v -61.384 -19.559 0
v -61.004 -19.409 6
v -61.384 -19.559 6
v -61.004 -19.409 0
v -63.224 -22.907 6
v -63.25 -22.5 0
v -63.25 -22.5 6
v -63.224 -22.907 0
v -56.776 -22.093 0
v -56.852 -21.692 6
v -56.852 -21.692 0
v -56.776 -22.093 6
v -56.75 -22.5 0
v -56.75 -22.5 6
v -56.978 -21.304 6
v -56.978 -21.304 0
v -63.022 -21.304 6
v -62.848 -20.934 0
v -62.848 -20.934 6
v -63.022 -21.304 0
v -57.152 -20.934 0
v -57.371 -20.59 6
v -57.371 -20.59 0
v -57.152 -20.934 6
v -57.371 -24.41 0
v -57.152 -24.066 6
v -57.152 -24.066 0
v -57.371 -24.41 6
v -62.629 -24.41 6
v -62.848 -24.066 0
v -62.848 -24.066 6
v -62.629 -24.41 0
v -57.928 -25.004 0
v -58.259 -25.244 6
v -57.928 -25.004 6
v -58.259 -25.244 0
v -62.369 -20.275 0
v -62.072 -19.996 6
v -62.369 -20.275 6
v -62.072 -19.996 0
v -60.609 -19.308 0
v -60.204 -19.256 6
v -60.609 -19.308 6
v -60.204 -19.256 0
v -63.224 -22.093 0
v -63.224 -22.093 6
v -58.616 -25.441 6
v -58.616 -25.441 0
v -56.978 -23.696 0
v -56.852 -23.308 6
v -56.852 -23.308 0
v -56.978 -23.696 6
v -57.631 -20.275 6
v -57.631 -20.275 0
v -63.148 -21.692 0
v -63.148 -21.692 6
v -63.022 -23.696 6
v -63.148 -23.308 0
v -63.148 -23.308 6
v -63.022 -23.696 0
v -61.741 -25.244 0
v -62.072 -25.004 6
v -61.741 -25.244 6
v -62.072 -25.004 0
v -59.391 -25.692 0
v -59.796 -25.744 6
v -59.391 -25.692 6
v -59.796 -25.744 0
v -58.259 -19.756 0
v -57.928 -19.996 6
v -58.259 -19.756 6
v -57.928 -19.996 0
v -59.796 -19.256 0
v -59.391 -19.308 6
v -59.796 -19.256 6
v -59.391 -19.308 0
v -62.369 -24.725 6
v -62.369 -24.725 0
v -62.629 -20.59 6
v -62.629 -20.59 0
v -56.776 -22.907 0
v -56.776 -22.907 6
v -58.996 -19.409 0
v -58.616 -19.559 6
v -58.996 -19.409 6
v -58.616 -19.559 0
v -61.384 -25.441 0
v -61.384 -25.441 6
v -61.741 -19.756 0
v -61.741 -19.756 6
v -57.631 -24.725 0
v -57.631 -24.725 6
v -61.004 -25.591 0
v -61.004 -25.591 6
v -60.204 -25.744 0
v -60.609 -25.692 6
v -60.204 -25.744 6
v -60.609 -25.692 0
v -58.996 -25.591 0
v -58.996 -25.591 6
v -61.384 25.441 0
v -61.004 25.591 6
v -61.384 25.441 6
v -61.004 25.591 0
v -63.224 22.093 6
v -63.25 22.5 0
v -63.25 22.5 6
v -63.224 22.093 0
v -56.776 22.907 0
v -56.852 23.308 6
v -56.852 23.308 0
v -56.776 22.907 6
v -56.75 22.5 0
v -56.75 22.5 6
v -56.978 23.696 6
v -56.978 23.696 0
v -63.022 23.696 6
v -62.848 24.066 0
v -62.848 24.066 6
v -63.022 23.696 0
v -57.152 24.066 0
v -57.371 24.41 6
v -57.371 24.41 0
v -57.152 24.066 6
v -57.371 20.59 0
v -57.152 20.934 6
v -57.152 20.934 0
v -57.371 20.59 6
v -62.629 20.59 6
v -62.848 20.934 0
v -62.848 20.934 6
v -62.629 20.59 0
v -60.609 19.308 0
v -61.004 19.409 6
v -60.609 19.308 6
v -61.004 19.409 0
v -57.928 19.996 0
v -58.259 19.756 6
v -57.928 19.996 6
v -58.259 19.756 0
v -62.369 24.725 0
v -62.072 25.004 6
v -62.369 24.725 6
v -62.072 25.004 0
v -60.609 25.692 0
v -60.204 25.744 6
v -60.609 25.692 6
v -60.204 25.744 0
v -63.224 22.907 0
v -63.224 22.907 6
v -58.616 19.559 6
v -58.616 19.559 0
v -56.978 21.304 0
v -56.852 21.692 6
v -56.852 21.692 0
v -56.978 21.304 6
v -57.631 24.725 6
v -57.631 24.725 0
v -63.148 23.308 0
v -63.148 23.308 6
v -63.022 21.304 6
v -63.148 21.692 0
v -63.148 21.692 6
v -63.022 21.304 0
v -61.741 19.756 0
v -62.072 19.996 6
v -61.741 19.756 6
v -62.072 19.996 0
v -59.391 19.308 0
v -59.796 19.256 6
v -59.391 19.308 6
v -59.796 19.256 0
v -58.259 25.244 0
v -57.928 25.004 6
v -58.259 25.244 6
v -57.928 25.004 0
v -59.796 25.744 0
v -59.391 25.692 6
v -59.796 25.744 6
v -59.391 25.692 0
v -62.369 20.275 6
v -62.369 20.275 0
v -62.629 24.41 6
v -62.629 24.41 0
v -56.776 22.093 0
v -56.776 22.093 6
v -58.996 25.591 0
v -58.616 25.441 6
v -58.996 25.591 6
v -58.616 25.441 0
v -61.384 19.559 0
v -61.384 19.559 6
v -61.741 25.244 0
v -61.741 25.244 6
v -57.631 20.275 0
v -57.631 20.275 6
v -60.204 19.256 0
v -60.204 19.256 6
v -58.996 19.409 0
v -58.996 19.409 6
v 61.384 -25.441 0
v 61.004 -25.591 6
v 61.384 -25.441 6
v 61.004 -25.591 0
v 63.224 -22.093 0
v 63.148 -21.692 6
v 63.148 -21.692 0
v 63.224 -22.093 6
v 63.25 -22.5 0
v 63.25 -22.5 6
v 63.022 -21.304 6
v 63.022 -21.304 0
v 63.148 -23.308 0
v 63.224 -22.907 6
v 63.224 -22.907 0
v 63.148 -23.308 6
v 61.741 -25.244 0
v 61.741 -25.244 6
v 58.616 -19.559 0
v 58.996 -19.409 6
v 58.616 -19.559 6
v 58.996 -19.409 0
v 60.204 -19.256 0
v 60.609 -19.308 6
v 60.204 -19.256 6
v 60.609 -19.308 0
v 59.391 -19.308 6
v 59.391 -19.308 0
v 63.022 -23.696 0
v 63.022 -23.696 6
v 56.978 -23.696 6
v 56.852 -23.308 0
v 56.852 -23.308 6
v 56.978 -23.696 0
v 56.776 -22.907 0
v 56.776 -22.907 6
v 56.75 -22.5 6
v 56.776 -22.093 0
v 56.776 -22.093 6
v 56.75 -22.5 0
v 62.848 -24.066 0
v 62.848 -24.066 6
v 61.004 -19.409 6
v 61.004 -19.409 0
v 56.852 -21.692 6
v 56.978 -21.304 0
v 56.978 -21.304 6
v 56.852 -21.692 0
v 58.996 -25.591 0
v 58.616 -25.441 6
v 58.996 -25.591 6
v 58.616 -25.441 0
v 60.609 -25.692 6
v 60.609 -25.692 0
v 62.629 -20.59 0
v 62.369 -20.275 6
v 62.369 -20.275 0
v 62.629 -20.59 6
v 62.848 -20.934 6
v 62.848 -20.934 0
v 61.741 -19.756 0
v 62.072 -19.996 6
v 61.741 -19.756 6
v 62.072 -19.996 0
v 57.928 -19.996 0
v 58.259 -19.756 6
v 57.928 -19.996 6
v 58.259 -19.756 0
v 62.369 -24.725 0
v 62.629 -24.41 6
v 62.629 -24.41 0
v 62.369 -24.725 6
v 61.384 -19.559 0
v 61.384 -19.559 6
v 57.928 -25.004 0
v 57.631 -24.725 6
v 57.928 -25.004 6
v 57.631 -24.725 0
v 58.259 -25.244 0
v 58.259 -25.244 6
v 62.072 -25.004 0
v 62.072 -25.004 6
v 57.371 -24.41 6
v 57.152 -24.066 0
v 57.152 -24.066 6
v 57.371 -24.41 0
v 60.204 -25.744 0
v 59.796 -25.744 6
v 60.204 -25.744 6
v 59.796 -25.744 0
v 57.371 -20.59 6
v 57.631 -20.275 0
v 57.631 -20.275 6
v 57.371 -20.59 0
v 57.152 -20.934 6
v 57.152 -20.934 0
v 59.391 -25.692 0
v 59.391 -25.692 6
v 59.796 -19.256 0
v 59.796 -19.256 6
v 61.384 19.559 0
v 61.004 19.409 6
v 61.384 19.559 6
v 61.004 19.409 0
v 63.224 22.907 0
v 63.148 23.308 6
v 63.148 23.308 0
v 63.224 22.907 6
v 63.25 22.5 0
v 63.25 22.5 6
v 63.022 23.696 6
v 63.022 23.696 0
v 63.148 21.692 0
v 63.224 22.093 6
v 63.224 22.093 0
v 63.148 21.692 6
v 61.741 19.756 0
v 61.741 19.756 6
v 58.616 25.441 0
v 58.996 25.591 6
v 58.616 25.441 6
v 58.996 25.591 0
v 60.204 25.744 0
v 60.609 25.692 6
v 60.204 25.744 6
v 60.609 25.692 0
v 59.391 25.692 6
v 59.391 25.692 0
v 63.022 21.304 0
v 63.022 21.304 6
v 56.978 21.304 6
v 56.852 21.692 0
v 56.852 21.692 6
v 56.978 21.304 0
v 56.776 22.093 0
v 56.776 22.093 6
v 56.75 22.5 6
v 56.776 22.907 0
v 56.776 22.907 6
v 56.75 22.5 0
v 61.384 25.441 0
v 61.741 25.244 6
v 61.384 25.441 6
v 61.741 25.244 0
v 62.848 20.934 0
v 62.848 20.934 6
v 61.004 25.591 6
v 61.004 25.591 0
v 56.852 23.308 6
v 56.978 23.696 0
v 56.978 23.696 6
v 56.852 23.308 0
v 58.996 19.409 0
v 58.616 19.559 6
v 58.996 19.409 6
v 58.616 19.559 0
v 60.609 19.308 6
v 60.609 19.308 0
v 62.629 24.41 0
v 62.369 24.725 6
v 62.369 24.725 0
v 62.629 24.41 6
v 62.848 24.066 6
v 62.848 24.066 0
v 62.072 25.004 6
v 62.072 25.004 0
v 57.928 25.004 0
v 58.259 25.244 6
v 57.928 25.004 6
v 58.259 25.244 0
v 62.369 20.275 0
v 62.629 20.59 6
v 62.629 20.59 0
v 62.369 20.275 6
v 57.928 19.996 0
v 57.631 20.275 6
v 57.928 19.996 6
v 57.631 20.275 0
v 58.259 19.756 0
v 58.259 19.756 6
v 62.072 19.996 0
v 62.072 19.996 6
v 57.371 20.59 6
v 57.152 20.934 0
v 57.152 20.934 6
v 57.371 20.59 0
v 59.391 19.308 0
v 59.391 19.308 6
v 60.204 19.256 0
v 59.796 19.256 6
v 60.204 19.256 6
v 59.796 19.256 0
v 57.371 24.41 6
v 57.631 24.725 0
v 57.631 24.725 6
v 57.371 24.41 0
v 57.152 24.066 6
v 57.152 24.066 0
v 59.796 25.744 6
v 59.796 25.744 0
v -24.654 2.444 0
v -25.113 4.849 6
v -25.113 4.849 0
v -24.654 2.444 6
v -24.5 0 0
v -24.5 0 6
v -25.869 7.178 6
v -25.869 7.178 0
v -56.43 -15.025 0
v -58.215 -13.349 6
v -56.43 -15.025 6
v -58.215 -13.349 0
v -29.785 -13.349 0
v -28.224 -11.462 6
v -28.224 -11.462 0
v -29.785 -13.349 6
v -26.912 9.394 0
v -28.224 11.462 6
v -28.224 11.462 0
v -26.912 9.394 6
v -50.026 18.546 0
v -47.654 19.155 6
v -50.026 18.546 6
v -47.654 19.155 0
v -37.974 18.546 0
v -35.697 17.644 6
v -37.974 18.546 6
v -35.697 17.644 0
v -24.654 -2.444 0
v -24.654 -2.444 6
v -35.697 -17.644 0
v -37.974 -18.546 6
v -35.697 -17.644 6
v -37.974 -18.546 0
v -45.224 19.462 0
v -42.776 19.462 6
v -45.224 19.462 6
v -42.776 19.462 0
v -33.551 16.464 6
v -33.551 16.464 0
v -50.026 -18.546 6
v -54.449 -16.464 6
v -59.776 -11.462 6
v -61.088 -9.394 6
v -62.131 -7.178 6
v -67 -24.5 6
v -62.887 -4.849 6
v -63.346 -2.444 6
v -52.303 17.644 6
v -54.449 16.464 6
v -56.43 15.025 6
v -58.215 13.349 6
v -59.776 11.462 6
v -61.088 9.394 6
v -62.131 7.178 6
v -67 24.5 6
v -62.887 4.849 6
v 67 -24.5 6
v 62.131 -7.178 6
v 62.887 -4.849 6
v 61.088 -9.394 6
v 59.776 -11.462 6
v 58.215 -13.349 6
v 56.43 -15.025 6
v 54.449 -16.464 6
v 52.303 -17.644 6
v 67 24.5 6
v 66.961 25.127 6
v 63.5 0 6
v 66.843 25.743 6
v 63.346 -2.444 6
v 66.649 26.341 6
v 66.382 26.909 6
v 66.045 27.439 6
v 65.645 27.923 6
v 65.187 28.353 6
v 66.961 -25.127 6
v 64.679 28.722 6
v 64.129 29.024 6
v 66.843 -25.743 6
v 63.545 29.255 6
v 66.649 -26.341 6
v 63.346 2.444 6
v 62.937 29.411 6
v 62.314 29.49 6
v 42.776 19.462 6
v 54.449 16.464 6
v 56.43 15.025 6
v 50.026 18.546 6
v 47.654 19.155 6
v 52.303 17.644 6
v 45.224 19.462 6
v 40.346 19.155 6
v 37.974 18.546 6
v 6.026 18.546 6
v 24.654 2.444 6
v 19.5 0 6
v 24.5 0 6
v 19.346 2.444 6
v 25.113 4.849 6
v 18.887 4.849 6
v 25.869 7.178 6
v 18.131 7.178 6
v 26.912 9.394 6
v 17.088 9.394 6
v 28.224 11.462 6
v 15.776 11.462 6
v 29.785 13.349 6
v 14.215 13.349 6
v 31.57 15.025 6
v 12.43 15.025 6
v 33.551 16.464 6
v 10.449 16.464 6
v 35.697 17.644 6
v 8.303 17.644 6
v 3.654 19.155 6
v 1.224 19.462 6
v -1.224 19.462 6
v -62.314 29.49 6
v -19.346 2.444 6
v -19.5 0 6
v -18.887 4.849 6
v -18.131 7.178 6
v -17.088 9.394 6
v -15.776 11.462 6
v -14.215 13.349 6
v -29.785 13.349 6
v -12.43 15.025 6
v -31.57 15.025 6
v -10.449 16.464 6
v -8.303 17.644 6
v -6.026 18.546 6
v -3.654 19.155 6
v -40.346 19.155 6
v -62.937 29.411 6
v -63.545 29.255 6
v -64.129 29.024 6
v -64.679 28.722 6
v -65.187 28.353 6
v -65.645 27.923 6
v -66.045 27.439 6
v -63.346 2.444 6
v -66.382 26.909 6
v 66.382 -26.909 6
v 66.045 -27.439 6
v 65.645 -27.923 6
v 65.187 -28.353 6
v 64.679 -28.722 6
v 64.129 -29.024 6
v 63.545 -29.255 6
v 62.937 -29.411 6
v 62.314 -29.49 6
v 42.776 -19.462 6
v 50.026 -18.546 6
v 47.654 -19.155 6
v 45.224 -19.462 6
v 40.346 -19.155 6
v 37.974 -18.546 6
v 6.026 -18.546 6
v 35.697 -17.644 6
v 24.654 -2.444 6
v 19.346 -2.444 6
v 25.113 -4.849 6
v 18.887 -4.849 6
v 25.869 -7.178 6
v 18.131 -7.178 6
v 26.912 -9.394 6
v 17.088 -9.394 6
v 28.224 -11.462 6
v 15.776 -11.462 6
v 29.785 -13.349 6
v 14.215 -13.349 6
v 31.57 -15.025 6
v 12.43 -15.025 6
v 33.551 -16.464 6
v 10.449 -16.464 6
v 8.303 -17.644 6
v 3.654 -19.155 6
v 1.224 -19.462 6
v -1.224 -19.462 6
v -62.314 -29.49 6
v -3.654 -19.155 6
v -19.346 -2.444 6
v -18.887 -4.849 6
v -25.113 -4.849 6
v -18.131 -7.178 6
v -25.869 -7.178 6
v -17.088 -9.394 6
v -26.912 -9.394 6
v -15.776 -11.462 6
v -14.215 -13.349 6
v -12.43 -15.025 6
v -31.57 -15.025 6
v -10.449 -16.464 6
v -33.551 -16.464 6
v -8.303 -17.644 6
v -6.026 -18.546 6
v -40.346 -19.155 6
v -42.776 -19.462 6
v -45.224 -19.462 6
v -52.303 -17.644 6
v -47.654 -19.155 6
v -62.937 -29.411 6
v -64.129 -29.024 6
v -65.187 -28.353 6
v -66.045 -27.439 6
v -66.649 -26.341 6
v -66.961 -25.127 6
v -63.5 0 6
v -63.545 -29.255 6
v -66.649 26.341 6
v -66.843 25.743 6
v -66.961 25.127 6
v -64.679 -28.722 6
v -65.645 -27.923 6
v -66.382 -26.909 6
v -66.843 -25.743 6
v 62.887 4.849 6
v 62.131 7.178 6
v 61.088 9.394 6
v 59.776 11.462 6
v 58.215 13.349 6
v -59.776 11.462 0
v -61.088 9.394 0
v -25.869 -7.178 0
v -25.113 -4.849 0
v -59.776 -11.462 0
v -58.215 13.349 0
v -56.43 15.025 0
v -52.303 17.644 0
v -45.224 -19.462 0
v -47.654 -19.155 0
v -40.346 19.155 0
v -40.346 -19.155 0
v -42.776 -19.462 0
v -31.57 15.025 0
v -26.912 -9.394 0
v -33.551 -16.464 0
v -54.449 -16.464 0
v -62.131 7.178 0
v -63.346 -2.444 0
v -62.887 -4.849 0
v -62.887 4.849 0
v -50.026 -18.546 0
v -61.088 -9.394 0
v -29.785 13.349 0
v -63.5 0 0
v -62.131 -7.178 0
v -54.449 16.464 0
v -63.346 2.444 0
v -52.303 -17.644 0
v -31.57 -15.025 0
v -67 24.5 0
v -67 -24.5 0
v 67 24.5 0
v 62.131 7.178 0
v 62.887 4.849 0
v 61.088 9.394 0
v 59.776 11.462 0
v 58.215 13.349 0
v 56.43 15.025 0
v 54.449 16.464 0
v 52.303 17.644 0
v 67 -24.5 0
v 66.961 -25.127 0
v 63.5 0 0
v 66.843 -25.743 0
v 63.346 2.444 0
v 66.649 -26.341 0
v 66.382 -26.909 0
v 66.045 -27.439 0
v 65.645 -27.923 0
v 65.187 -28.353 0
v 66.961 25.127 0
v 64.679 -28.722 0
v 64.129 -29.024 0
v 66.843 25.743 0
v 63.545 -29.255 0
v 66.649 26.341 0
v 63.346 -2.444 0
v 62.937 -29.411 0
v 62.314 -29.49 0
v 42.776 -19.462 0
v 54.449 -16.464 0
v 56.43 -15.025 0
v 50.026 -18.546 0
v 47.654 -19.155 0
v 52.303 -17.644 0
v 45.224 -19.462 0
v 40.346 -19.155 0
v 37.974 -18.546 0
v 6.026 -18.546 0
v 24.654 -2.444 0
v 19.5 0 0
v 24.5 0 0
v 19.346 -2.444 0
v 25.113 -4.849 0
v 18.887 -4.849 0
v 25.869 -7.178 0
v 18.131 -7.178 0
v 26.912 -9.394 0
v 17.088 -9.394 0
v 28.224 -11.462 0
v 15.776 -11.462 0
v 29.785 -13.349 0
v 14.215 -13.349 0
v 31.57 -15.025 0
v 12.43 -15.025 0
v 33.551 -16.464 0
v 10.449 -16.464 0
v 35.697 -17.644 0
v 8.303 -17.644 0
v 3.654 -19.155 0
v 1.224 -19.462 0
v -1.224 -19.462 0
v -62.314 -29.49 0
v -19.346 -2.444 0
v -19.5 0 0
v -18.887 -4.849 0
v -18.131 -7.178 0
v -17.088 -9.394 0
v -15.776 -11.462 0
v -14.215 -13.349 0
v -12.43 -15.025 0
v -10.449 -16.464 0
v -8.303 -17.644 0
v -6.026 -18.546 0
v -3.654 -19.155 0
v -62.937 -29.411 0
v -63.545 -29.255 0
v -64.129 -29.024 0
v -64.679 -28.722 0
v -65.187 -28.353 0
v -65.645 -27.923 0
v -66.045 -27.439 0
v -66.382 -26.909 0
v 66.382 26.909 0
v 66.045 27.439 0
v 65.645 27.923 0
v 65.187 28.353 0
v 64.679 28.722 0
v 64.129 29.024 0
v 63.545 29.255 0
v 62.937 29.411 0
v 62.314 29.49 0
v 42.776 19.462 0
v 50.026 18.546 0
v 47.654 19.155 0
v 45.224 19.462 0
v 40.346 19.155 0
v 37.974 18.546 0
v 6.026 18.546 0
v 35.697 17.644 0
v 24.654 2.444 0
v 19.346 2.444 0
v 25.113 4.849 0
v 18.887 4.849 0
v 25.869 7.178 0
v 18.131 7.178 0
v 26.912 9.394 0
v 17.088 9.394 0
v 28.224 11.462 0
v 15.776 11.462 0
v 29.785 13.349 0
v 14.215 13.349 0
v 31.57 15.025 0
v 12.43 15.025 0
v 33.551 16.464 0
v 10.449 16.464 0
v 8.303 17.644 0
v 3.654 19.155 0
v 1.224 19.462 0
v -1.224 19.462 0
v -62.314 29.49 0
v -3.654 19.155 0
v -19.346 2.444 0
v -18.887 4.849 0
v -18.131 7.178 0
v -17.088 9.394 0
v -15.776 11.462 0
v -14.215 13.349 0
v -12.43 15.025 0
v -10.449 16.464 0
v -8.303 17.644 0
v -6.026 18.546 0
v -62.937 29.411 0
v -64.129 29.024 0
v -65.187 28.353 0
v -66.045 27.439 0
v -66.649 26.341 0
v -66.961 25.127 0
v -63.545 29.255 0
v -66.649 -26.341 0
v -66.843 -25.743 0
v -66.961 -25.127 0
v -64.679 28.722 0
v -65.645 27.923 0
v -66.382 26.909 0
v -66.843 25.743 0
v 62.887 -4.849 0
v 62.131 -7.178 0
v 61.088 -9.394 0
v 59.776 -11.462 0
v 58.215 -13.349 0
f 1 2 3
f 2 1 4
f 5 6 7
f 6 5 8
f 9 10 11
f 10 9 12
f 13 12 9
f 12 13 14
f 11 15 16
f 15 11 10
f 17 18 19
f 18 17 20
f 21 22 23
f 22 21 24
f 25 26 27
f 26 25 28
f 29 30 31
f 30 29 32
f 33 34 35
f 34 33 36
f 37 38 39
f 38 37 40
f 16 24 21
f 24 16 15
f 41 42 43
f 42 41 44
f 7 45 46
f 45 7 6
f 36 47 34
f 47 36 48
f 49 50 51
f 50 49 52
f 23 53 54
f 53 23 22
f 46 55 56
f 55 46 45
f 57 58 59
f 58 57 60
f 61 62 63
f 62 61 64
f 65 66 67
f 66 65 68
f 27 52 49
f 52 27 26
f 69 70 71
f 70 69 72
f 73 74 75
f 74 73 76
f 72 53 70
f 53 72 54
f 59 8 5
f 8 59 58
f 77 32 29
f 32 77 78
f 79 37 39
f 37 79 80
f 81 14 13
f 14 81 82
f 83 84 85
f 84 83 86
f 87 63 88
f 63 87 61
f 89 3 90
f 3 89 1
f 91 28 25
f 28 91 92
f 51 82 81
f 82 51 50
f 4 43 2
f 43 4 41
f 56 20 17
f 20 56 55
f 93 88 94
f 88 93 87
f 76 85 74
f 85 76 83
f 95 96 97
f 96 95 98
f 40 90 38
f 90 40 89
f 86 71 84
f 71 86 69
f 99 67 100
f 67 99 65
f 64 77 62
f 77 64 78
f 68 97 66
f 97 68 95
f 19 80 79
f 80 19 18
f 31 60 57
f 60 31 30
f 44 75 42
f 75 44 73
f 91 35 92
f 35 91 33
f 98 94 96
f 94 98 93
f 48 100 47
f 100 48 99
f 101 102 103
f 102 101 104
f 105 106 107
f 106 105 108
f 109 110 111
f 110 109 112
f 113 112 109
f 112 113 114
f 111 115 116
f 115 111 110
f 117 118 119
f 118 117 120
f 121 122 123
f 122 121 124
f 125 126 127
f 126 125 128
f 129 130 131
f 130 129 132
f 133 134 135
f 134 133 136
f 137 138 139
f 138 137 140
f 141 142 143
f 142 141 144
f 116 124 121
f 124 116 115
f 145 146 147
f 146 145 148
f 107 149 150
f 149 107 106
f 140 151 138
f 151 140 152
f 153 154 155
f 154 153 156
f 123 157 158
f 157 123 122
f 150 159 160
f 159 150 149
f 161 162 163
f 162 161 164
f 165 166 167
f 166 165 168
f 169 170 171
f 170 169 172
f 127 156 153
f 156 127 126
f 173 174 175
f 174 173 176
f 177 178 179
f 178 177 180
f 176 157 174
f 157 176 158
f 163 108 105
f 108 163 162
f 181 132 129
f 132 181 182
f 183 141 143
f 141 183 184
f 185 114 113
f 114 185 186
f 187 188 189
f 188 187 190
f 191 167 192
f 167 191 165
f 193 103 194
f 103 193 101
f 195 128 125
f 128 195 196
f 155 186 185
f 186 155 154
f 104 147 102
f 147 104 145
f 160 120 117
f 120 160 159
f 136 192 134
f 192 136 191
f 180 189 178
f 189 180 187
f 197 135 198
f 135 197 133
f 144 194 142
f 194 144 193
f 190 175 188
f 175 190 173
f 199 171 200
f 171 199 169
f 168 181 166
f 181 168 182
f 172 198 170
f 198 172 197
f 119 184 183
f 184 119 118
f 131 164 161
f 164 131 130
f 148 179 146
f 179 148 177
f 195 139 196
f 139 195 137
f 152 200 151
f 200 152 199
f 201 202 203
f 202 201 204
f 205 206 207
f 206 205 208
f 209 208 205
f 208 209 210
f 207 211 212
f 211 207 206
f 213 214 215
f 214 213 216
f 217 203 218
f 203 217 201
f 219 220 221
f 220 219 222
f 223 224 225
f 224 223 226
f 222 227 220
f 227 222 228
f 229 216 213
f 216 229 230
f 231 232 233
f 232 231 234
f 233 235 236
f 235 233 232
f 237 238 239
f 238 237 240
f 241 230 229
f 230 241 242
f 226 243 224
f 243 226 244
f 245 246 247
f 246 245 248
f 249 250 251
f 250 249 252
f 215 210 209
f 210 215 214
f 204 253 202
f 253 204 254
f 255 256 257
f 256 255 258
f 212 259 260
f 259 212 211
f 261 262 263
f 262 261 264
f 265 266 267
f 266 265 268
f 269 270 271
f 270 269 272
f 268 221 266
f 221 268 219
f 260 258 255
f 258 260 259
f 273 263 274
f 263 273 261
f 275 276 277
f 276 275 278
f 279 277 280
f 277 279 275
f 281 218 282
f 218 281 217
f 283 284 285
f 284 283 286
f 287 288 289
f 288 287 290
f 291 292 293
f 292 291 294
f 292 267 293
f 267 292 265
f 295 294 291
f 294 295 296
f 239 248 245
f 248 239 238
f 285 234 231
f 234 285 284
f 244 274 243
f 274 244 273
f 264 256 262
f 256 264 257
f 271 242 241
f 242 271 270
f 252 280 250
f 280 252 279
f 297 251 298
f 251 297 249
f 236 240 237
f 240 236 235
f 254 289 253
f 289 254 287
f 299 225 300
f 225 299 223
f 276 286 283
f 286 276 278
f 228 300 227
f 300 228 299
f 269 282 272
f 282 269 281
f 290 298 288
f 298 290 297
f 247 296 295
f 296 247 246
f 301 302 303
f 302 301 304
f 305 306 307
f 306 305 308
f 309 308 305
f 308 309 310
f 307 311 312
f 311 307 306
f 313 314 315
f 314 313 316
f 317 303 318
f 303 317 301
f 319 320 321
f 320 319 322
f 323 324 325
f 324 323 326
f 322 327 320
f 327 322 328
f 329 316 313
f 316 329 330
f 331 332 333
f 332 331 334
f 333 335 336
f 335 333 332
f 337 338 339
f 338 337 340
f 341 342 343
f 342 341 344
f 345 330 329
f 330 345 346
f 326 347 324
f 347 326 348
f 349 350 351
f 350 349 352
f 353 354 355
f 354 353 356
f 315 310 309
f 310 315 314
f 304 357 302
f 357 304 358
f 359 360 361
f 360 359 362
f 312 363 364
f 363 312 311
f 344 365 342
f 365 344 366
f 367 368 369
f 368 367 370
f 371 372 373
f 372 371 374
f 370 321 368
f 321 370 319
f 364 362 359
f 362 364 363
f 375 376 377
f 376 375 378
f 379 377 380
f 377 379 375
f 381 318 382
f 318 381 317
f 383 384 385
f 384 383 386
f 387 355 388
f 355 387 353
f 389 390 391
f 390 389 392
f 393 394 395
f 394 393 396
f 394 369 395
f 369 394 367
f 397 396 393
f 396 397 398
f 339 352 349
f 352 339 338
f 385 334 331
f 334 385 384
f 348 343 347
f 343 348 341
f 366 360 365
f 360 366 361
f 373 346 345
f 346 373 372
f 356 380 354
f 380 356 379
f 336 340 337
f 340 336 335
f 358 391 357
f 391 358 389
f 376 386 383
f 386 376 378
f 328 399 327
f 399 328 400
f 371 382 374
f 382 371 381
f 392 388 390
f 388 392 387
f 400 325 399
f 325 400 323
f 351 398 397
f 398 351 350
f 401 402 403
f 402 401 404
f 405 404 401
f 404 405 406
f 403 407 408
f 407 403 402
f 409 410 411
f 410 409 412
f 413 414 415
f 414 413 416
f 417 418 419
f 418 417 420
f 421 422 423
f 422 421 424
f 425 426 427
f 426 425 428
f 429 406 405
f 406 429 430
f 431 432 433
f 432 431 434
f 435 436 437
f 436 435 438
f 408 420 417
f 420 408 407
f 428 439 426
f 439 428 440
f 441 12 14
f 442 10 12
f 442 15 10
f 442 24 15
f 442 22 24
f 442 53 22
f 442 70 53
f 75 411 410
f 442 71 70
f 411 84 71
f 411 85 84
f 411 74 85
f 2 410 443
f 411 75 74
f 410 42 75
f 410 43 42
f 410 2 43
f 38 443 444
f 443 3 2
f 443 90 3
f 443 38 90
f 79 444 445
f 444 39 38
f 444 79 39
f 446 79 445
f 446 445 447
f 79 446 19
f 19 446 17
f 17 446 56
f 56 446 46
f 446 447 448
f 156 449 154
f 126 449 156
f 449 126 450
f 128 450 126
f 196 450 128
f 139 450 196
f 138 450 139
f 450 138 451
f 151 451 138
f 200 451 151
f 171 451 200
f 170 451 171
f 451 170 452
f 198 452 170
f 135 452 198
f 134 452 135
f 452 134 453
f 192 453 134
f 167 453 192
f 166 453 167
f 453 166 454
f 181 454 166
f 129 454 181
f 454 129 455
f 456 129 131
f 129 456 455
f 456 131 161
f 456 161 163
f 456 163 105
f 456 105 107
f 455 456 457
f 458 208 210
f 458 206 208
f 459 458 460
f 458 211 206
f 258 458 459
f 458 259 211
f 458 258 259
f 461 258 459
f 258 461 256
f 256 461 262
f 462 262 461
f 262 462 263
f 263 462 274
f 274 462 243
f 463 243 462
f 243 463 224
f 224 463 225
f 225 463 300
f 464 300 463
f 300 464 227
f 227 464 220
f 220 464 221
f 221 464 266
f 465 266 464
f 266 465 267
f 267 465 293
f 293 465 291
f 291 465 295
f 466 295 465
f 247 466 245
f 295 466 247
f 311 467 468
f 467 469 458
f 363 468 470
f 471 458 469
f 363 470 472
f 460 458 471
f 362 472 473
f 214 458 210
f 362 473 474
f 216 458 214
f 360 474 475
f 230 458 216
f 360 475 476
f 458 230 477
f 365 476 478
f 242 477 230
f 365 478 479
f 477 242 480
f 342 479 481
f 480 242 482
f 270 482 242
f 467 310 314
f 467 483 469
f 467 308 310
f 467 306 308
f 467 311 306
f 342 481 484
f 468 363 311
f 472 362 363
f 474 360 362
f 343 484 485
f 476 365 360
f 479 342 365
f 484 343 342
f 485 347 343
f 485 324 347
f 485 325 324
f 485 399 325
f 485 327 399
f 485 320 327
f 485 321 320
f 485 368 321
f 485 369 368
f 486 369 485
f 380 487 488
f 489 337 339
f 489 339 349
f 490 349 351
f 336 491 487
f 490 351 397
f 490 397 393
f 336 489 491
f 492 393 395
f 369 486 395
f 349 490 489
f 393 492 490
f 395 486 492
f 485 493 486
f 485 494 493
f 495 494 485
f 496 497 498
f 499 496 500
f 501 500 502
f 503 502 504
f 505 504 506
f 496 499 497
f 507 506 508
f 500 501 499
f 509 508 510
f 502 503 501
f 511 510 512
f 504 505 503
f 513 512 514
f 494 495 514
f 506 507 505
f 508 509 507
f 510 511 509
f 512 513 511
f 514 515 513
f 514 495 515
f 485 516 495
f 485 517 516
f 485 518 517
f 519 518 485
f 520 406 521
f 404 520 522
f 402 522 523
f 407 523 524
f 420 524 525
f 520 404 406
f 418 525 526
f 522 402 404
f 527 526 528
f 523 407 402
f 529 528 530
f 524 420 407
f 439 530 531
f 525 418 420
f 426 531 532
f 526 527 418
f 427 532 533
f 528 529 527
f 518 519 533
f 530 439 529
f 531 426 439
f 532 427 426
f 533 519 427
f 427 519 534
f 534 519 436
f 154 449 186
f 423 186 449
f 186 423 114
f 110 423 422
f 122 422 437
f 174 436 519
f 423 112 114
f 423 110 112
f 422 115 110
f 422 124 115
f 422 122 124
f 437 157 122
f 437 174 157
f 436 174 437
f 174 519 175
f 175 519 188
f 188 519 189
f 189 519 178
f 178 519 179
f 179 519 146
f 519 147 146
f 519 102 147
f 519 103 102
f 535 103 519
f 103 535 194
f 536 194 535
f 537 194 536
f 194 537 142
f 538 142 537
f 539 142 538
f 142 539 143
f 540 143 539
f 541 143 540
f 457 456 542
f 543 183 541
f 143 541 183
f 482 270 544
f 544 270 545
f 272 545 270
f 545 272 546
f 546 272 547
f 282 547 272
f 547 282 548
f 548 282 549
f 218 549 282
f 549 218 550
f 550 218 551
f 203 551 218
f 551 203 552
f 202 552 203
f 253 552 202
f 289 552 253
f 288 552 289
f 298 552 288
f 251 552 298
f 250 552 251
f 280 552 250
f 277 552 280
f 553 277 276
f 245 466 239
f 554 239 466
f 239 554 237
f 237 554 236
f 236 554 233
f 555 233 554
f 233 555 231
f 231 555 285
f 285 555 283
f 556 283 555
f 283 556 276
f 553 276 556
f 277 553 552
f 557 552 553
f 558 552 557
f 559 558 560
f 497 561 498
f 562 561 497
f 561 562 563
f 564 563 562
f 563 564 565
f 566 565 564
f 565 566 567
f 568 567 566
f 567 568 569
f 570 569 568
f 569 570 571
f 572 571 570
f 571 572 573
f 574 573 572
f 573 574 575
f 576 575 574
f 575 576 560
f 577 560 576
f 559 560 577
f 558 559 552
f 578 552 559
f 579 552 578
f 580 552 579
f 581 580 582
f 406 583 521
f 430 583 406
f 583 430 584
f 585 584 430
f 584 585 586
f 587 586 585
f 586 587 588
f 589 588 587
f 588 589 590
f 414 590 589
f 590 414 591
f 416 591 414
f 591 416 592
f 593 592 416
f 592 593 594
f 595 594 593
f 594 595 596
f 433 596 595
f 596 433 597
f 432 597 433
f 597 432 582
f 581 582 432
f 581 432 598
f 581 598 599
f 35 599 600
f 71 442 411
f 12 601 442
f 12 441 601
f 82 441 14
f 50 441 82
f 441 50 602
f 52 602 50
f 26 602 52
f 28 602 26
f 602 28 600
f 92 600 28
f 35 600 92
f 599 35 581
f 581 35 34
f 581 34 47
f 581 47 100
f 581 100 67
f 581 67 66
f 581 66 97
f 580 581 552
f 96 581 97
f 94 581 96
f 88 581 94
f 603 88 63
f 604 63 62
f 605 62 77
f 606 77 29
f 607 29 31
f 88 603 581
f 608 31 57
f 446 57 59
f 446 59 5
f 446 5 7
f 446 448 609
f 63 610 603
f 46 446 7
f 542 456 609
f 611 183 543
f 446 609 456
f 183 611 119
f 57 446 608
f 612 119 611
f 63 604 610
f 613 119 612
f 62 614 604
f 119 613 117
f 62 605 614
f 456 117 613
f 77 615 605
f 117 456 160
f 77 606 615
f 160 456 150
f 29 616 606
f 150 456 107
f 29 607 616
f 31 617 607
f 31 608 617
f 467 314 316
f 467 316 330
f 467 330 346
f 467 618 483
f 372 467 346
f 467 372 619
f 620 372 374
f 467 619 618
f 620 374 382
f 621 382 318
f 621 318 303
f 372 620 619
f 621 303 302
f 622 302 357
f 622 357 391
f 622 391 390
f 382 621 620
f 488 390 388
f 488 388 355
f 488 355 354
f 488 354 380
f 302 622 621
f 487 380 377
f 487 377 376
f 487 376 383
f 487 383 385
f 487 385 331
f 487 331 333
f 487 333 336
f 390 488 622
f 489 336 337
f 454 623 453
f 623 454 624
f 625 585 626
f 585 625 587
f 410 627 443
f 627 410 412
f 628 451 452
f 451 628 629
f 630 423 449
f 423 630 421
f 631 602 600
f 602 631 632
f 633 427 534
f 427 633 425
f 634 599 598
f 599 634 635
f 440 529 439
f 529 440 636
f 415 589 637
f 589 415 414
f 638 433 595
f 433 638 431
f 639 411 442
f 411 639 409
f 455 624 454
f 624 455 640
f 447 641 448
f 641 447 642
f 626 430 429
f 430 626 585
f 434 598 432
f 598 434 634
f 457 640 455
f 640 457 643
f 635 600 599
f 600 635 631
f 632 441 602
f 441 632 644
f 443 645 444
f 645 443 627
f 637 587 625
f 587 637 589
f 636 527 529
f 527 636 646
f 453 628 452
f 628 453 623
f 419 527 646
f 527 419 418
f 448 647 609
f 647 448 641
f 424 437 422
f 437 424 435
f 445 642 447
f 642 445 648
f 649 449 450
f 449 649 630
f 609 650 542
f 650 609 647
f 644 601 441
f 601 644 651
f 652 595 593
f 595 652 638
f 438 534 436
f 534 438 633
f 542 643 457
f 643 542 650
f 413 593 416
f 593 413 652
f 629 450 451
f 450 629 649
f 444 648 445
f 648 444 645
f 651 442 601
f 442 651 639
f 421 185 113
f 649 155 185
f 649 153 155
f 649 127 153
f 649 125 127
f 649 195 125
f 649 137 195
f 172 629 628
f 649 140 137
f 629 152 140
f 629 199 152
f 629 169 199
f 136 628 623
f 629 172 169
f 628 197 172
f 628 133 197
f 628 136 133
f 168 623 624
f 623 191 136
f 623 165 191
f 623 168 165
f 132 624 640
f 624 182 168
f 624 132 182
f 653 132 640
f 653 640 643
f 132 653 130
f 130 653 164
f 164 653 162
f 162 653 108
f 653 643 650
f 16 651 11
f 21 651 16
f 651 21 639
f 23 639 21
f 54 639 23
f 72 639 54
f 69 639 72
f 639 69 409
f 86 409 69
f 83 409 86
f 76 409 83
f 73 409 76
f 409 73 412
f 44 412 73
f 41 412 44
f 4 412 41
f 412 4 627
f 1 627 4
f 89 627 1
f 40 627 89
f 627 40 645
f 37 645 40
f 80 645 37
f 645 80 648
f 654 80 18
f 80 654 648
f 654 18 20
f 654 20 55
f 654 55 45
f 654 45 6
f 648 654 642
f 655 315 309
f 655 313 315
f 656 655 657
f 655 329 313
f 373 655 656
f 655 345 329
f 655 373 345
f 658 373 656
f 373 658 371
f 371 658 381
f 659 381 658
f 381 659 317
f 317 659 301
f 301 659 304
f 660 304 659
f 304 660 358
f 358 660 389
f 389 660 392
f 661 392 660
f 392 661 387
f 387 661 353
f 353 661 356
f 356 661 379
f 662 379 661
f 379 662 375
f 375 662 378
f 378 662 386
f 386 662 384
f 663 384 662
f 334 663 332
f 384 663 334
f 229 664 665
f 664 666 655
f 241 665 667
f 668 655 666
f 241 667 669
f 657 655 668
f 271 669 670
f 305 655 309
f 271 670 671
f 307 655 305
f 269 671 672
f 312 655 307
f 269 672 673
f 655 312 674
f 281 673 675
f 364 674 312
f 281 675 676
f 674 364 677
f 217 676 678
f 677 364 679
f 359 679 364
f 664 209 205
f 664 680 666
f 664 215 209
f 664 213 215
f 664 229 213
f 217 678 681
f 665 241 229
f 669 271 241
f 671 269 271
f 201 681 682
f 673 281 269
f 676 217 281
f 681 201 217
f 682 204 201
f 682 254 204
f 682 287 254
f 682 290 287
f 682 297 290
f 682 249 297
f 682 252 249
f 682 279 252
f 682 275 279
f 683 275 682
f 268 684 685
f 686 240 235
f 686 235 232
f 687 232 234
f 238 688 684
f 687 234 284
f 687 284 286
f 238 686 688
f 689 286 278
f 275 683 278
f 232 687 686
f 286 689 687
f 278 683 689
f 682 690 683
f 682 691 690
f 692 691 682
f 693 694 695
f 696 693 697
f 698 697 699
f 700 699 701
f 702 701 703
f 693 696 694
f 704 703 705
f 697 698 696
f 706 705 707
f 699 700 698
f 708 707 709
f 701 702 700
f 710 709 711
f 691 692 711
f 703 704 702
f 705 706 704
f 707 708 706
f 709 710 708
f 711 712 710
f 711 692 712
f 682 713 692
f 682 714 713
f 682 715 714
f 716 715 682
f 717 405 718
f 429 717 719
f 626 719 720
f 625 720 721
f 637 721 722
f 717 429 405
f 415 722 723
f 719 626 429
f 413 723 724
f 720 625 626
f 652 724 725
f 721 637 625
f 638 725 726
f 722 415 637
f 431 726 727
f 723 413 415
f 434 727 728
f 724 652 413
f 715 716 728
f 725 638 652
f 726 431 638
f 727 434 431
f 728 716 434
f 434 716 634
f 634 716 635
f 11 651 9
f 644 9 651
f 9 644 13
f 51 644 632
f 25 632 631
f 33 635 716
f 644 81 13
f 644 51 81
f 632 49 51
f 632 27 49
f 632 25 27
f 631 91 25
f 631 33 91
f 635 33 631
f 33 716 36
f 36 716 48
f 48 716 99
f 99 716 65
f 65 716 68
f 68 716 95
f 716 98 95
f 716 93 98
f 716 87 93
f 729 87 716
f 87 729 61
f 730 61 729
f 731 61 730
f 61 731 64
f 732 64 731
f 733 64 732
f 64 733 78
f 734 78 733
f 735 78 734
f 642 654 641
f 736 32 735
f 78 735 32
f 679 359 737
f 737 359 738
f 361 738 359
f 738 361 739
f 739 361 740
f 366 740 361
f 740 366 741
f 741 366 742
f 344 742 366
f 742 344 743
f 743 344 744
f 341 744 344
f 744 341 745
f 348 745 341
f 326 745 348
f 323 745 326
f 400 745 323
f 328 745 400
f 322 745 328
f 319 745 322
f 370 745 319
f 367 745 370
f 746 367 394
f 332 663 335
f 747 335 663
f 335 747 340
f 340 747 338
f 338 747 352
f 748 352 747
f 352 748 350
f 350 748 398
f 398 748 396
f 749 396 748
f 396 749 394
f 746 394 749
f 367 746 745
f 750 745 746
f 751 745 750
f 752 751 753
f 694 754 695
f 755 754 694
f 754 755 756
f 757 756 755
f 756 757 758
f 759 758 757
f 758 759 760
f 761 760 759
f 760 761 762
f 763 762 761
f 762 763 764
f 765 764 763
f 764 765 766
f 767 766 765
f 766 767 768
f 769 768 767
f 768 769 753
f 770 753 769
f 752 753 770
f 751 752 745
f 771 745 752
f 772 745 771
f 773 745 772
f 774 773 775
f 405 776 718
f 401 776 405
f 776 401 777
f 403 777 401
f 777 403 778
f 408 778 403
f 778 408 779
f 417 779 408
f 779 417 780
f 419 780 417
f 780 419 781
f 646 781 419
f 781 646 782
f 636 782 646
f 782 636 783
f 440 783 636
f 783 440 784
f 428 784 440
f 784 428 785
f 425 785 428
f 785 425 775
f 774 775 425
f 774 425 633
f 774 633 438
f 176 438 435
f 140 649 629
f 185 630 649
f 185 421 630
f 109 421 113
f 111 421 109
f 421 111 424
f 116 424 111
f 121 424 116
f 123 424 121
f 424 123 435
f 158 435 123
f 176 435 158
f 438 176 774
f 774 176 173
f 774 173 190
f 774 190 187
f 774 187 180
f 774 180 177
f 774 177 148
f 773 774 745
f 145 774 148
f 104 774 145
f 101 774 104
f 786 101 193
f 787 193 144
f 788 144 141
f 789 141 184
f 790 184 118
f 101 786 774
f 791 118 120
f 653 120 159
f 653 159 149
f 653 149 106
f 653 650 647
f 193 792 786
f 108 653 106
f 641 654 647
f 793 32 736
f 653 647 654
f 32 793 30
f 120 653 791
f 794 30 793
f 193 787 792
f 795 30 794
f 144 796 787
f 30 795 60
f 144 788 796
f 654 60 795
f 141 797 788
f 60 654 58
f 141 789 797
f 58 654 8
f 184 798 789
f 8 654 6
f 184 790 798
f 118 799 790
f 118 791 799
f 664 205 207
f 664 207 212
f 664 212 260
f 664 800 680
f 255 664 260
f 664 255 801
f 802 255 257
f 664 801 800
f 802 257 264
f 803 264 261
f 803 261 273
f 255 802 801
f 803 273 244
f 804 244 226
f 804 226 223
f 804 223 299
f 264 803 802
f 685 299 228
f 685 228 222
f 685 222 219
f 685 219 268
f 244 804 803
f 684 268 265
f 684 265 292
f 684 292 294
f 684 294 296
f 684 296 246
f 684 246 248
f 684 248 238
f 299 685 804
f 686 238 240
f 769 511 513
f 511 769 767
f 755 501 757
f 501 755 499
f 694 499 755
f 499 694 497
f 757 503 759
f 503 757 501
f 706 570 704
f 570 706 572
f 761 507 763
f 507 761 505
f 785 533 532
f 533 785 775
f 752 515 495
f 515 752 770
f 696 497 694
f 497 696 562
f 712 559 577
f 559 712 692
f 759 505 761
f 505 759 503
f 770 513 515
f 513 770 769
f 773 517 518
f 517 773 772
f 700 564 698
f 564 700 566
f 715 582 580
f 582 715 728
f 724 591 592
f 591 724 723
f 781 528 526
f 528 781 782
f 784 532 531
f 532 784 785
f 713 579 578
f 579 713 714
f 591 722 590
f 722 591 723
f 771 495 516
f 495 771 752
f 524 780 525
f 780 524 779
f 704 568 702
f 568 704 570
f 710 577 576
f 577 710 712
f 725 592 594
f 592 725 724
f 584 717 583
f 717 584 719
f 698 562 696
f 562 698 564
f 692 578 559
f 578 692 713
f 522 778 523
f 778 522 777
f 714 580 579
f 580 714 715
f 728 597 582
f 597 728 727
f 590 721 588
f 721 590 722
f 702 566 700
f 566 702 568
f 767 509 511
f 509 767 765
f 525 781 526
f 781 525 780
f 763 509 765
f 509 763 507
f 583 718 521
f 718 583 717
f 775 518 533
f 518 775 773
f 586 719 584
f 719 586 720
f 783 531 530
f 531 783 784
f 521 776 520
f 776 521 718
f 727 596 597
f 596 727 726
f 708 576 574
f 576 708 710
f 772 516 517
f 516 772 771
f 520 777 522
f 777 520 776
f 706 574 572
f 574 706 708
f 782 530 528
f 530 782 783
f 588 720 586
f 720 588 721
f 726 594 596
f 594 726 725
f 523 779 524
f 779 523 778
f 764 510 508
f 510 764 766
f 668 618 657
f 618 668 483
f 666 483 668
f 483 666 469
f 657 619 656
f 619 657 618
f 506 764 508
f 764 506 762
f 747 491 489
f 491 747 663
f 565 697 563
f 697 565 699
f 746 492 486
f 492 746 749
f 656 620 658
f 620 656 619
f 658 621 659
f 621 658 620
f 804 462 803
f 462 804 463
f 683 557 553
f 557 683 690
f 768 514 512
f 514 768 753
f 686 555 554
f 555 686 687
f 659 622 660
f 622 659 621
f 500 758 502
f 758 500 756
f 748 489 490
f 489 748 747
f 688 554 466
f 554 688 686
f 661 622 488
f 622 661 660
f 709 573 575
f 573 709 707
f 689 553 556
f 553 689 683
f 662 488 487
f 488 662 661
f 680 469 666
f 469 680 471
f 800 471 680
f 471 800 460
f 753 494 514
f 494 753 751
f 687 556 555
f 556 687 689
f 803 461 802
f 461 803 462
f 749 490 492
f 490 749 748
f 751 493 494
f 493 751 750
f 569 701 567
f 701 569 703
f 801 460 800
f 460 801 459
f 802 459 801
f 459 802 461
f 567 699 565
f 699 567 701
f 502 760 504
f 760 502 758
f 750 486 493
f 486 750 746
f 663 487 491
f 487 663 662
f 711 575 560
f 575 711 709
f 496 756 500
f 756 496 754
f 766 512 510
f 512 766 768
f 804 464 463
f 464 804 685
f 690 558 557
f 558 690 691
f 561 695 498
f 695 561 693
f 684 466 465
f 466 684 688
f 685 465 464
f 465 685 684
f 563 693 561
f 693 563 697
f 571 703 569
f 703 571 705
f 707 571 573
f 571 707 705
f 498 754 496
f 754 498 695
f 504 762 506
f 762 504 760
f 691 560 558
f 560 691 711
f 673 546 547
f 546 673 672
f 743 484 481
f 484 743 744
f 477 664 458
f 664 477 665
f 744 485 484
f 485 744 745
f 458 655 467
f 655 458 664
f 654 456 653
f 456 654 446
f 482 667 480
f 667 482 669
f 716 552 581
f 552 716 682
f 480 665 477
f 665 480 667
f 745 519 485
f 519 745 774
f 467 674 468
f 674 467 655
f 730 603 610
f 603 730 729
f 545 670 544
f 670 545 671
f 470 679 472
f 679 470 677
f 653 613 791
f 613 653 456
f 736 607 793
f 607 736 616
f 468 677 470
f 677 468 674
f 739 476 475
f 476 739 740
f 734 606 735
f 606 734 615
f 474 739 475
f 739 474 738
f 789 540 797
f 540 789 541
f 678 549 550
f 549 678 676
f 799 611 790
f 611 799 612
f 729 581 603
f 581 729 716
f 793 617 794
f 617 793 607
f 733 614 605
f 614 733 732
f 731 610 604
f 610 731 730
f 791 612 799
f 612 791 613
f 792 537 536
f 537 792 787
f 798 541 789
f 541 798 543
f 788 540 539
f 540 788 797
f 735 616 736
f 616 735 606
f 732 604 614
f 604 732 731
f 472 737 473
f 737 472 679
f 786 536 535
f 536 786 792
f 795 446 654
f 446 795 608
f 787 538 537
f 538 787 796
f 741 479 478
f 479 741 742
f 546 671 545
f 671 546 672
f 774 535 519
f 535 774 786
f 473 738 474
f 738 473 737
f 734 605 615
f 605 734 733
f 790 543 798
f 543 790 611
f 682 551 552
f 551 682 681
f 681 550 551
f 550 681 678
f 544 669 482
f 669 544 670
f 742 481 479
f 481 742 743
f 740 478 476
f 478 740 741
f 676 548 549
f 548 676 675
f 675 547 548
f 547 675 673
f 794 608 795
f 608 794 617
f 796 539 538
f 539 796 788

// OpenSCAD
$fn = 50;

difference() {
	union() {
		hull() {
			translate(v = [-62.0, 24.5, 0]) {
				cylinder(h = 6, r = 5);
			}
			translate(v = [62.0, 24.5, 0]) {
				cylinder(h = 6, r = 5);
			}
			translate(v = [-62.0, -24.5, 0]) {
				cylinder(h = 6, r = 5);
			}
			translate(v = [62.0, -24.5, 0]) {
				cylinder(h = 6, r = 5);
			}
		}
	}
	union() {
		translate(v = [-60.0, -22.5, -100.0]) {
			cylinder(h = 200, r = 3.25);
		}
		translate(v = [-60.0, 22.5, -100.0]) {
			cylinder(h = 200, r = 3.25);
		}
		translate(v = [60.0, -22.5, -100.0]) {
			cylinder(h = 200, r = 3.25);
		}
		translate(v = [60.0, 22.5, -100.0]) {
			cylinder(h = 200, r = 3.25);
		}
		translate(v = [-60.0, -22.5, -100.0]) {
			cylinder(h = 200, r = 1.8);
		}
		translate(v = [-60.0, 22.5, -100.0]) {
			cylinder(h = 200, r = 1.8);
		}
		translate(v = [60.0, -22.5, -100.0]) {
			cylinder(h = 200, r = 1.8);
		}
		translate(v = [60.0, 22.5, -100.0]) {
			cylinder(h = 200, r = 1.8);
		}
		translate(v = [-44.0, 0, 0.0]) {
			cylinder(h = 6, r = 19.5);
		}
		cylinder(h = 6, r = 19.5);
		translate(v = [44.0, 0, 0.0]) {
			cylinder(h = 6, r = 19.5);
		}
	}
}
